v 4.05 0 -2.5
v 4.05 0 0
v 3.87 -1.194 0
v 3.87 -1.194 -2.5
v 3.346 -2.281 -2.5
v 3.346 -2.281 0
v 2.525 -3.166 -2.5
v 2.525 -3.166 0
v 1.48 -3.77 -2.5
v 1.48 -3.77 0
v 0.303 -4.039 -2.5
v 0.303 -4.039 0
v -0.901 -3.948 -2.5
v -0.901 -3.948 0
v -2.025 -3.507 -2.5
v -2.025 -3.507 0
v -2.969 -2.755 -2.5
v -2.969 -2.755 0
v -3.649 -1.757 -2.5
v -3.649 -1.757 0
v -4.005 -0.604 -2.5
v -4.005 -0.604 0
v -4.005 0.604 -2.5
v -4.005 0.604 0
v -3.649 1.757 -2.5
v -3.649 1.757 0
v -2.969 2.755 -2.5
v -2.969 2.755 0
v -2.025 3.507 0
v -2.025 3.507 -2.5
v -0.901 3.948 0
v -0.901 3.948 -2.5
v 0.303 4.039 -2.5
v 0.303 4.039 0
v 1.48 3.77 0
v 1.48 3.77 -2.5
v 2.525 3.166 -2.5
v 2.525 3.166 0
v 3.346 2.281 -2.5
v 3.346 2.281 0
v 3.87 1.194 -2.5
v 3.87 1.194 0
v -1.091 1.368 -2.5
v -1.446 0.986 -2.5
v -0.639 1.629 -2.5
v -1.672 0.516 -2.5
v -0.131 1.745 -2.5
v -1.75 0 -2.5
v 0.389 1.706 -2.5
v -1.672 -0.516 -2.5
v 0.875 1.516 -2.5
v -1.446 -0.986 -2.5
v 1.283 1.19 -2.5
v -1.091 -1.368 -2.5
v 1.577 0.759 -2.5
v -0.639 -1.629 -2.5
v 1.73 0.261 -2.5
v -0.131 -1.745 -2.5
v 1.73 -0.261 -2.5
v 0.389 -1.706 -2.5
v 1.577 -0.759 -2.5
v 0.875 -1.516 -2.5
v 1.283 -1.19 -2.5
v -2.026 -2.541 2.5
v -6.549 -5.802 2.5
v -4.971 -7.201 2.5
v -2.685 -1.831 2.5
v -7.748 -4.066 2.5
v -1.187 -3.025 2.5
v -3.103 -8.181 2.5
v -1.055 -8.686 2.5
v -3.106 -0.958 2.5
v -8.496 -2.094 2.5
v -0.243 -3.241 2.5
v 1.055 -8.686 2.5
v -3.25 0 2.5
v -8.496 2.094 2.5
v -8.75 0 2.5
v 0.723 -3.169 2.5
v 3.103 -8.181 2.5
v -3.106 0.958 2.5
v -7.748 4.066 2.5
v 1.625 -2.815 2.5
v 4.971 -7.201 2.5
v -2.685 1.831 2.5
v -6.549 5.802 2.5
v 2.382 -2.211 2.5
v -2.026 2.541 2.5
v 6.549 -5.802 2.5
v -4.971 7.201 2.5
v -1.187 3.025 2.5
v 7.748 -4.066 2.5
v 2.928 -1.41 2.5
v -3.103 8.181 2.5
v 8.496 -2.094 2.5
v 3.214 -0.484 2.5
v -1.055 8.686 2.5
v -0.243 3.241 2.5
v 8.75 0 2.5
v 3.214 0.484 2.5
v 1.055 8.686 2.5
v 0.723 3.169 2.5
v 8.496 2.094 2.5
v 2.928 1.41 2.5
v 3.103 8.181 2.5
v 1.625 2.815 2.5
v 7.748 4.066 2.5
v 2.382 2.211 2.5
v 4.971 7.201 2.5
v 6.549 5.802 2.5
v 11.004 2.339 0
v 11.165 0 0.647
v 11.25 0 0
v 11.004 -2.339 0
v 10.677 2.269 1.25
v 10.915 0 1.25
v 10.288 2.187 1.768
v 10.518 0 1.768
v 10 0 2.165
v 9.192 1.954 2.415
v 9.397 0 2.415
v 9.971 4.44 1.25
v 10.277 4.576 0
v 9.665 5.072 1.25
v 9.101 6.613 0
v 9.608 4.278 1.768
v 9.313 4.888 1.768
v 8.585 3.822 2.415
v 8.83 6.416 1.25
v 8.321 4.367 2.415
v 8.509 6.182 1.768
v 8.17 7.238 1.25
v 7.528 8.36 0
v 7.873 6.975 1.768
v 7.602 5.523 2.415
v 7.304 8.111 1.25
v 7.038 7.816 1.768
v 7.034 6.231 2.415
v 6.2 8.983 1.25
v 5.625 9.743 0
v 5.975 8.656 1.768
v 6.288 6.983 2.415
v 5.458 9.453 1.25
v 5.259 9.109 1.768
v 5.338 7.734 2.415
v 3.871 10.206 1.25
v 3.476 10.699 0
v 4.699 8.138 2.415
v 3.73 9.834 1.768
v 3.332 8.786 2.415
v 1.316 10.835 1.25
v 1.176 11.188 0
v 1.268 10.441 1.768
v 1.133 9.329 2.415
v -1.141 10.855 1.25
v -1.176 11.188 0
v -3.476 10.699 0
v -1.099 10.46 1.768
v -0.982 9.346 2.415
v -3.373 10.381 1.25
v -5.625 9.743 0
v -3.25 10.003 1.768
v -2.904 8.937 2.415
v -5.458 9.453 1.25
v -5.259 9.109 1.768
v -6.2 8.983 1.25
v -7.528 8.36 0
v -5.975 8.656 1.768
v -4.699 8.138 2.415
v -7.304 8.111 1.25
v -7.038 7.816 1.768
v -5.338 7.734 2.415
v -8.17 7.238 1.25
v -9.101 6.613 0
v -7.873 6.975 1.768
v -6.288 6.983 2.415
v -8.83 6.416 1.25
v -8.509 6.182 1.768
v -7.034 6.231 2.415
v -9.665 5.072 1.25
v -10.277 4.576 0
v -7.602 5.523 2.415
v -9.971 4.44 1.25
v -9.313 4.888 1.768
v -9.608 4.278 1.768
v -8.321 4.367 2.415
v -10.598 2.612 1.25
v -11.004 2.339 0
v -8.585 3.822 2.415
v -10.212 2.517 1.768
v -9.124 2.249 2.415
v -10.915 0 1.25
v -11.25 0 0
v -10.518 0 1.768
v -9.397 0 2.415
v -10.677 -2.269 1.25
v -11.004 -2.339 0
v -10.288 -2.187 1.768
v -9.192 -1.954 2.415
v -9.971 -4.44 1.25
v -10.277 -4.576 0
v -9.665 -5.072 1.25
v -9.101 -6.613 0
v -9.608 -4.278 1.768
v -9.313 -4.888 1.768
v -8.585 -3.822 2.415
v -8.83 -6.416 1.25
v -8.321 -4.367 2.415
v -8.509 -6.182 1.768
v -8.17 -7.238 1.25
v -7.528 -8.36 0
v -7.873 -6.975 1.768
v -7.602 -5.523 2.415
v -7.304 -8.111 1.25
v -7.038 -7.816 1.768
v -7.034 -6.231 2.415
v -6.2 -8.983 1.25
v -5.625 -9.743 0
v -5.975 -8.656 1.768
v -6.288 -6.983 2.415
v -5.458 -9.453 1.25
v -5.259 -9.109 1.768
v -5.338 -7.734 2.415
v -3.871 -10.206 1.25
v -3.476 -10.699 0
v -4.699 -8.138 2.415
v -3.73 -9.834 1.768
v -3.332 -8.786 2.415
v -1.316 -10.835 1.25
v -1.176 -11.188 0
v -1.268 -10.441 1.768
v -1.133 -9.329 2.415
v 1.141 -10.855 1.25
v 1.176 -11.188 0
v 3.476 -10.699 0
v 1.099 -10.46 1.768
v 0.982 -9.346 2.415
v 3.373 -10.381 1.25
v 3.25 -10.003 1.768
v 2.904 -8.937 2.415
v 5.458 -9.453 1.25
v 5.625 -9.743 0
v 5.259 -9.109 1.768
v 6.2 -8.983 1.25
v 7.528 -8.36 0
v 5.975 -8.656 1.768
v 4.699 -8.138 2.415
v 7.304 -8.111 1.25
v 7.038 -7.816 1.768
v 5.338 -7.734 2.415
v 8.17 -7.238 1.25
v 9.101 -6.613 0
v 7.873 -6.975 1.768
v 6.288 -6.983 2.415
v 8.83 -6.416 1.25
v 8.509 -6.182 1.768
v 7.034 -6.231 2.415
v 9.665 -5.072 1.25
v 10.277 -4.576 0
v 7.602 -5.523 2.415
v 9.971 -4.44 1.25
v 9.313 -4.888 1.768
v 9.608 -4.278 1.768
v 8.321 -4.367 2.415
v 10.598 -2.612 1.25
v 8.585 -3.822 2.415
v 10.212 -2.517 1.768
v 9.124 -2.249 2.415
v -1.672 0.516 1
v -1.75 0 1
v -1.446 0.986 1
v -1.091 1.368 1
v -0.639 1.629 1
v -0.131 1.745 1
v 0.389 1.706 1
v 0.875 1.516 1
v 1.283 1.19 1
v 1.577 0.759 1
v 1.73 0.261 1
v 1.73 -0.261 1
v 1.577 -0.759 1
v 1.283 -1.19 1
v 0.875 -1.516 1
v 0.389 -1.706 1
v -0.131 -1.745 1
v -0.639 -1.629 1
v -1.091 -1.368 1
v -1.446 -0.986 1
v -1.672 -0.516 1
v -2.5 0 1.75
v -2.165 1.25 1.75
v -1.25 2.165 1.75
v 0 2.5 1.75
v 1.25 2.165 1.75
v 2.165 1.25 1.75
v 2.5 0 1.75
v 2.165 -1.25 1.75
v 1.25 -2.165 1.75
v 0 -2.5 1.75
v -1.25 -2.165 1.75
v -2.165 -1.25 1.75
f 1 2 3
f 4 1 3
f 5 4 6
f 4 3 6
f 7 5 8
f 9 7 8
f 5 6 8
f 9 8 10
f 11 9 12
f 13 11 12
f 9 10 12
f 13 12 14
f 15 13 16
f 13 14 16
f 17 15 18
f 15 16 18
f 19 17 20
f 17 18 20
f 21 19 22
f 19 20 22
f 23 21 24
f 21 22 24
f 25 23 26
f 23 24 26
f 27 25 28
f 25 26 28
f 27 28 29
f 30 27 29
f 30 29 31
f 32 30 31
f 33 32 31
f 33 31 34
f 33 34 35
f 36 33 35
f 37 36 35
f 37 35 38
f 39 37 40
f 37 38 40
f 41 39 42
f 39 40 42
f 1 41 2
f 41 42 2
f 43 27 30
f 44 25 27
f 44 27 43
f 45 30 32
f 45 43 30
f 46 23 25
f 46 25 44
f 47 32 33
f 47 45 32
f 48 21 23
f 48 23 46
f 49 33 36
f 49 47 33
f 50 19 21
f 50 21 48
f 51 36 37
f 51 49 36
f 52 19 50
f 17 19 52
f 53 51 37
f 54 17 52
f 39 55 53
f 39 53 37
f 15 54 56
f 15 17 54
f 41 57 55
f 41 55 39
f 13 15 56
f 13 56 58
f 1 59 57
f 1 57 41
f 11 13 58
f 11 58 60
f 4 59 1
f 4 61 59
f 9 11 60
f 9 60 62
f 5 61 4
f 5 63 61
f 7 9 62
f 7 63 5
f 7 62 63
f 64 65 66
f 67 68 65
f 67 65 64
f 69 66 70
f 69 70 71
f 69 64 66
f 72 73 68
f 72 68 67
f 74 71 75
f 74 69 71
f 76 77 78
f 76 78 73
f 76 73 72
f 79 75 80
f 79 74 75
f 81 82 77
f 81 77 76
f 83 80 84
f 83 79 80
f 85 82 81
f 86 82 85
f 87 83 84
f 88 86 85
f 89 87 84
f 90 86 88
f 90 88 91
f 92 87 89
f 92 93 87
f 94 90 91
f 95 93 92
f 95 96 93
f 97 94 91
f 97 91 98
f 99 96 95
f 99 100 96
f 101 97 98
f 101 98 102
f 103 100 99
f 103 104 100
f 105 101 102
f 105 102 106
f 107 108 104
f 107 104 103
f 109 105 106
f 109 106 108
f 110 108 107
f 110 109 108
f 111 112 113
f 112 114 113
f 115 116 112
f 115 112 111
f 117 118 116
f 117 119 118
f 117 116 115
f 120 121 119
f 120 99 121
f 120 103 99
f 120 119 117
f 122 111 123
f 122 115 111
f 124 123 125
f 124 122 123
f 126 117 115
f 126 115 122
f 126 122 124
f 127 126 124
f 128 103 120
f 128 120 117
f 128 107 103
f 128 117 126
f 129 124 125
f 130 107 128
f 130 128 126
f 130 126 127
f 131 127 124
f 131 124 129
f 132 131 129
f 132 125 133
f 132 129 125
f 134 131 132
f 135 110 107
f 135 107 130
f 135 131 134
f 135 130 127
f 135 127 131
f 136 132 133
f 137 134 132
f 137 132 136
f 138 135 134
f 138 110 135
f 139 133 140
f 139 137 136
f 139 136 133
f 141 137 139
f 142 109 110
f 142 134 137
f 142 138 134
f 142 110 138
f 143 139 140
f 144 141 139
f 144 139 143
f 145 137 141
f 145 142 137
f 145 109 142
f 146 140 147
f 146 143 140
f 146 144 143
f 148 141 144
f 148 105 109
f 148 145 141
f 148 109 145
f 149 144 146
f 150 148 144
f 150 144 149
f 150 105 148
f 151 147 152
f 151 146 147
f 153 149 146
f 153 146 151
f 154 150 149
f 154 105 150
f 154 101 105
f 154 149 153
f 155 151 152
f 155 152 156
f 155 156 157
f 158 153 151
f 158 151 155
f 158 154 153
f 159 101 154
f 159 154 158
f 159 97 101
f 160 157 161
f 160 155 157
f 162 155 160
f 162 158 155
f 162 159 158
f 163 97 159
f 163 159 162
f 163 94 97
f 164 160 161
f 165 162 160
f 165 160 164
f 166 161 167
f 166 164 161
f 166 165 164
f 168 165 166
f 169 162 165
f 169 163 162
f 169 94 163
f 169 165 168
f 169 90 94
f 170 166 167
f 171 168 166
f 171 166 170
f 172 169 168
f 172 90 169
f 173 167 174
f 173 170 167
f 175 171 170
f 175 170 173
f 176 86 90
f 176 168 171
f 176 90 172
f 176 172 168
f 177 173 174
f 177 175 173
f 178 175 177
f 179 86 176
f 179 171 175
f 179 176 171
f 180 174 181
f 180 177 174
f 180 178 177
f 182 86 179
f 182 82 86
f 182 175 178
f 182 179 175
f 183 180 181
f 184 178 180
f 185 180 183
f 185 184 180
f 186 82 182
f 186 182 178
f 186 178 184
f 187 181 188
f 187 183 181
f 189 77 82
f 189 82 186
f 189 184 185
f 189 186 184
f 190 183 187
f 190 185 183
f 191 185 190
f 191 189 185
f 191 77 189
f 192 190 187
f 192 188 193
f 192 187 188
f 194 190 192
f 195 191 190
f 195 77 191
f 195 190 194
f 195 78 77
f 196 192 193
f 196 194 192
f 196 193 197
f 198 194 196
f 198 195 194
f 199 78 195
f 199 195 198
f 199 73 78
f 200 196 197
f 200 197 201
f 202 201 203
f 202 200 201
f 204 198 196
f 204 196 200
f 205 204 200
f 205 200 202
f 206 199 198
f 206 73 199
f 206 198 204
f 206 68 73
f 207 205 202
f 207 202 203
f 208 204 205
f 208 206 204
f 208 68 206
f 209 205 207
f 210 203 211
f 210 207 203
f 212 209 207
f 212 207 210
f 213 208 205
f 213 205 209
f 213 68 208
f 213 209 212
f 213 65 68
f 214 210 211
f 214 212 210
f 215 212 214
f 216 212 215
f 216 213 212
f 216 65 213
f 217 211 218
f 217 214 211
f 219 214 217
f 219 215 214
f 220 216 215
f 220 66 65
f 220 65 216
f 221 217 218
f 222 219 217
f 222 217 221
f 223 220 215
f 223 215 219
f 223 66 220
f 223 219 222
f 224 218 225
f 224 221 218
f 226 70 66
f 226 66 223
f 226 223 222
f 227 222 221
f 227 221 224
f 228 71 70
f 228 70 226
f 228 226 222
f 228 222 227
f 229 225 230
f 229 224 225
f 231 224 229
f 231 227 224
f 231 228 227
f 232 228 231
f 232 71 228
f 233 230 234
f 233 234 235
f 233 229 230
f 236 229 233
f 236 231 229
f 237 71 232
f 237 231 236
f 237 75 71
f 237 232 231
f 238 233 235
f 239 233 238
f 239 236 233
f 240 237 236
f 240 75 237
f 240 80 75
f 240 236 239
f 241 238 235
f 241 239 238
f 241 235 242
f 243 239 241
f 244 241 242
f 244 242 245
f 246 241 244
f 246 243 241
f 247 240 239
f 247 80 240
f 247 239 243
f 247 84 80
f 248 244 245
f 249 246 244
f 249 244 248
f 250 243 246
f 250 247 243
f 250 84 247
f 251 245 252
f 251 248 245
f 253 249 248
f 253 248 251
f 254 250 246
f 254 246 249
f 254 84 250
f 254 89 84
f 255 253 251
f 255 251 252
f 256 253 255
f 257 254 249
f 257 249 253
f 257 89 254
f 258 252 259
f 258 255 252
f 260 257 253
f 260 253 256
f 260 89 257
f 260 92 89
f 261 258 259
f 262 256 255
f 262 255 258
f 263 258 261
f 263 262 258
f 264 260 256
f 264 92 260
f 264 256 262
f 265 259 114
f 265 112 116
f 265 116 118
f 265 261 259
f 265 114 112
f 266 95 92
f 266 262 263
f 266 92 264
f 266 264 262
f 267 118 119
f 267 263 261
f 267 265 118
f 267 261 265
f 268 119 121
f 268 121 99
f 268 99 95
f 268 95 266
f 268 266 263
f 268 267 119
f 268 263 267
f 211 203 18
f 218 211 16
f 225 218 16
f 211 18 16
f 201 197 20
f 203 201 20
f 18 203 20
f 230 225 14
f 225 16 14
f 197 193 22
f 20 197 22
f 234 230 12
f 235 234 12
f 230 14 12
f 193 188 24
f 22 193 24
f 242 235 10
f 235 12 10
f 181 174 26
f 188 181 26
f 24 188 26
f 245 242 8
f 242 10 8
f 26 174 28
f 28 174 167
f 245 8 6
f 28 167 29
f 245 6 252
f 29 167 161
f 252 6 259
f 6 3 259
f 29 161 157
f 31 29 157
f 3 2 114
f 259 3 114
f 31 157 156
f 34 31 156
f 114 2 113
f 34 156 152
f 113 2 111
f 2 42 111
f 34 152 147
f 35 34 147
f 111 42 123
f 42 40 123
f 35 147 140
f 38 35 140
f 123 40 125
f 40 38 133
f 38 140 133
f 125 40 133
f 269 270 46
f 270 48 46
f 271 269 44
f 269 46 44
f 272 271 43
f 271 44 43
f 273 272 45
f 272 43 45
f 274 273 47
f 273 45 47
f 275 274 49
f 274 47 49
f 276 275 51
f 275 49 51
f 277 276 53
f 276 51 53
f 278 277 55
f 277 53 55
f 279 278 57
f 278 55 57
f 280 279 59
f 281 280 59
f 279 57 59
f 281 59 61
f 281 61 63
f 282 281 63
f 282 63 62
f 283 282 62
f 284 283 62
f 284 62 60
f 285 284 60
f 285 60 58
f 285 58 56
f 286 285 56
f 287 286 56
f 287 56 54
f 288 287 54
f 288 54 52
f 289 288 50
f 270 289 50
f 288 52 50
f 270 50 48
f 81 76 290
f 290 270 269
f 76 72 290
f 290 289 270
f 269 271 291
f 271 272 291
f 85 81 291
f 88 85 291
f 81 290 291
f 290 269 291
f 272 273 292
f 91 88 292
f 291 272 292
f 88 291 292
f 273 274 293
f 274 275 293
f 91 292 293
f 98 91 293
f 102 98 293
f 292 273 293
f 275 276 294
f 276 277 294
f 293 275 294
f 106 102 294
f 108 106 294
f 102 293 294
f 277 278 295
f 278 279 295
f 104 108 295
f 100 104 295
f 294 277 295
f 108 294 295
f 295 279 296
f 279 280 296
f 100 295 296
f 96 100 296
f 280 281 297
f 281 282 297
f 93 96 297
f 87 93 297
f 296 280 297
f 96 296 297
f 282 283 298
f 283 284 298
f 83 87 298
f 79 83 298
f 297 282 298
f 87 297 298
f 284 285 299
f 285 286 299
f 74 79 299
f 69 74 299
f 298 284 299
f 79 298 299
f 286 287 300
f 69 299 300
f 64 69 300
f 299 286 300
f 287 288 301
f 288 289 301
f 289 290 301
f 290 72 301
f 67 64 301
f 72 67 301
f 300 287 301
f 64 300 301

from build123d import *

# Parameters (mm, degrees)
F0_R           = 11.25
F1_DEPTH       = 2.5
F2_R           = 2.49999
F4_R           = 4.05
F5_DEPTH       = 2.5
F6_D           = 3.5
F6_DEPTH       = 7
F6_CSINK_D     = 6.5
F6_CSINK_ANGLE = 90
F6_TIP         = 1.0515060833


# Not quite as in the source:
# - a fillet or chamfer is up to 0.001 mm smaller than in the source, because OpenCascade refuses the exact size


with BuildPart() as f1:
    # F0 (on Top) → F1 (new body)
    with BuildSketch(Plane.XY):
        Circle(F0_R)
    extrude(amount=F1_DEPTH)

    # F2 (radius 2.5 in the source; OpenCascade refuses exactly that, so slightly less here)
    f2_edges = [f1.edges().sort_by_distance(p)[0] for p in [
        (-11.25, 0, 2.5),
    ]]
    fillet(f2_edges, radius=F2_R)

    # F4 (on face) → F5 (join)
    with BuildSketch(Plane(origin=(0, 0, 0), x_dir=(1, 0, 0), z_dir=(0, 0, -1))):
        Circle(F4_R)
    extrude(amount=F5_DEPTH)

    # F6
    with Locations(Plane.XY.offset(2.5)):
        with Locations((0, 0)):
            CounterSinkHole(F6_D / 2, F6_CSINK_D / 2, depth=F6_DEPTH, counter_sink_angle=F6_CSINK_ANGLE)
            with Locations((0, 0, -(F6_DEPTH + F6_TIP / 2))):  # 118° drill point
                Cone(0, F6_D / 2, F6_TIP, mode=Mode.SUBTRACT)


solid = f1.part
